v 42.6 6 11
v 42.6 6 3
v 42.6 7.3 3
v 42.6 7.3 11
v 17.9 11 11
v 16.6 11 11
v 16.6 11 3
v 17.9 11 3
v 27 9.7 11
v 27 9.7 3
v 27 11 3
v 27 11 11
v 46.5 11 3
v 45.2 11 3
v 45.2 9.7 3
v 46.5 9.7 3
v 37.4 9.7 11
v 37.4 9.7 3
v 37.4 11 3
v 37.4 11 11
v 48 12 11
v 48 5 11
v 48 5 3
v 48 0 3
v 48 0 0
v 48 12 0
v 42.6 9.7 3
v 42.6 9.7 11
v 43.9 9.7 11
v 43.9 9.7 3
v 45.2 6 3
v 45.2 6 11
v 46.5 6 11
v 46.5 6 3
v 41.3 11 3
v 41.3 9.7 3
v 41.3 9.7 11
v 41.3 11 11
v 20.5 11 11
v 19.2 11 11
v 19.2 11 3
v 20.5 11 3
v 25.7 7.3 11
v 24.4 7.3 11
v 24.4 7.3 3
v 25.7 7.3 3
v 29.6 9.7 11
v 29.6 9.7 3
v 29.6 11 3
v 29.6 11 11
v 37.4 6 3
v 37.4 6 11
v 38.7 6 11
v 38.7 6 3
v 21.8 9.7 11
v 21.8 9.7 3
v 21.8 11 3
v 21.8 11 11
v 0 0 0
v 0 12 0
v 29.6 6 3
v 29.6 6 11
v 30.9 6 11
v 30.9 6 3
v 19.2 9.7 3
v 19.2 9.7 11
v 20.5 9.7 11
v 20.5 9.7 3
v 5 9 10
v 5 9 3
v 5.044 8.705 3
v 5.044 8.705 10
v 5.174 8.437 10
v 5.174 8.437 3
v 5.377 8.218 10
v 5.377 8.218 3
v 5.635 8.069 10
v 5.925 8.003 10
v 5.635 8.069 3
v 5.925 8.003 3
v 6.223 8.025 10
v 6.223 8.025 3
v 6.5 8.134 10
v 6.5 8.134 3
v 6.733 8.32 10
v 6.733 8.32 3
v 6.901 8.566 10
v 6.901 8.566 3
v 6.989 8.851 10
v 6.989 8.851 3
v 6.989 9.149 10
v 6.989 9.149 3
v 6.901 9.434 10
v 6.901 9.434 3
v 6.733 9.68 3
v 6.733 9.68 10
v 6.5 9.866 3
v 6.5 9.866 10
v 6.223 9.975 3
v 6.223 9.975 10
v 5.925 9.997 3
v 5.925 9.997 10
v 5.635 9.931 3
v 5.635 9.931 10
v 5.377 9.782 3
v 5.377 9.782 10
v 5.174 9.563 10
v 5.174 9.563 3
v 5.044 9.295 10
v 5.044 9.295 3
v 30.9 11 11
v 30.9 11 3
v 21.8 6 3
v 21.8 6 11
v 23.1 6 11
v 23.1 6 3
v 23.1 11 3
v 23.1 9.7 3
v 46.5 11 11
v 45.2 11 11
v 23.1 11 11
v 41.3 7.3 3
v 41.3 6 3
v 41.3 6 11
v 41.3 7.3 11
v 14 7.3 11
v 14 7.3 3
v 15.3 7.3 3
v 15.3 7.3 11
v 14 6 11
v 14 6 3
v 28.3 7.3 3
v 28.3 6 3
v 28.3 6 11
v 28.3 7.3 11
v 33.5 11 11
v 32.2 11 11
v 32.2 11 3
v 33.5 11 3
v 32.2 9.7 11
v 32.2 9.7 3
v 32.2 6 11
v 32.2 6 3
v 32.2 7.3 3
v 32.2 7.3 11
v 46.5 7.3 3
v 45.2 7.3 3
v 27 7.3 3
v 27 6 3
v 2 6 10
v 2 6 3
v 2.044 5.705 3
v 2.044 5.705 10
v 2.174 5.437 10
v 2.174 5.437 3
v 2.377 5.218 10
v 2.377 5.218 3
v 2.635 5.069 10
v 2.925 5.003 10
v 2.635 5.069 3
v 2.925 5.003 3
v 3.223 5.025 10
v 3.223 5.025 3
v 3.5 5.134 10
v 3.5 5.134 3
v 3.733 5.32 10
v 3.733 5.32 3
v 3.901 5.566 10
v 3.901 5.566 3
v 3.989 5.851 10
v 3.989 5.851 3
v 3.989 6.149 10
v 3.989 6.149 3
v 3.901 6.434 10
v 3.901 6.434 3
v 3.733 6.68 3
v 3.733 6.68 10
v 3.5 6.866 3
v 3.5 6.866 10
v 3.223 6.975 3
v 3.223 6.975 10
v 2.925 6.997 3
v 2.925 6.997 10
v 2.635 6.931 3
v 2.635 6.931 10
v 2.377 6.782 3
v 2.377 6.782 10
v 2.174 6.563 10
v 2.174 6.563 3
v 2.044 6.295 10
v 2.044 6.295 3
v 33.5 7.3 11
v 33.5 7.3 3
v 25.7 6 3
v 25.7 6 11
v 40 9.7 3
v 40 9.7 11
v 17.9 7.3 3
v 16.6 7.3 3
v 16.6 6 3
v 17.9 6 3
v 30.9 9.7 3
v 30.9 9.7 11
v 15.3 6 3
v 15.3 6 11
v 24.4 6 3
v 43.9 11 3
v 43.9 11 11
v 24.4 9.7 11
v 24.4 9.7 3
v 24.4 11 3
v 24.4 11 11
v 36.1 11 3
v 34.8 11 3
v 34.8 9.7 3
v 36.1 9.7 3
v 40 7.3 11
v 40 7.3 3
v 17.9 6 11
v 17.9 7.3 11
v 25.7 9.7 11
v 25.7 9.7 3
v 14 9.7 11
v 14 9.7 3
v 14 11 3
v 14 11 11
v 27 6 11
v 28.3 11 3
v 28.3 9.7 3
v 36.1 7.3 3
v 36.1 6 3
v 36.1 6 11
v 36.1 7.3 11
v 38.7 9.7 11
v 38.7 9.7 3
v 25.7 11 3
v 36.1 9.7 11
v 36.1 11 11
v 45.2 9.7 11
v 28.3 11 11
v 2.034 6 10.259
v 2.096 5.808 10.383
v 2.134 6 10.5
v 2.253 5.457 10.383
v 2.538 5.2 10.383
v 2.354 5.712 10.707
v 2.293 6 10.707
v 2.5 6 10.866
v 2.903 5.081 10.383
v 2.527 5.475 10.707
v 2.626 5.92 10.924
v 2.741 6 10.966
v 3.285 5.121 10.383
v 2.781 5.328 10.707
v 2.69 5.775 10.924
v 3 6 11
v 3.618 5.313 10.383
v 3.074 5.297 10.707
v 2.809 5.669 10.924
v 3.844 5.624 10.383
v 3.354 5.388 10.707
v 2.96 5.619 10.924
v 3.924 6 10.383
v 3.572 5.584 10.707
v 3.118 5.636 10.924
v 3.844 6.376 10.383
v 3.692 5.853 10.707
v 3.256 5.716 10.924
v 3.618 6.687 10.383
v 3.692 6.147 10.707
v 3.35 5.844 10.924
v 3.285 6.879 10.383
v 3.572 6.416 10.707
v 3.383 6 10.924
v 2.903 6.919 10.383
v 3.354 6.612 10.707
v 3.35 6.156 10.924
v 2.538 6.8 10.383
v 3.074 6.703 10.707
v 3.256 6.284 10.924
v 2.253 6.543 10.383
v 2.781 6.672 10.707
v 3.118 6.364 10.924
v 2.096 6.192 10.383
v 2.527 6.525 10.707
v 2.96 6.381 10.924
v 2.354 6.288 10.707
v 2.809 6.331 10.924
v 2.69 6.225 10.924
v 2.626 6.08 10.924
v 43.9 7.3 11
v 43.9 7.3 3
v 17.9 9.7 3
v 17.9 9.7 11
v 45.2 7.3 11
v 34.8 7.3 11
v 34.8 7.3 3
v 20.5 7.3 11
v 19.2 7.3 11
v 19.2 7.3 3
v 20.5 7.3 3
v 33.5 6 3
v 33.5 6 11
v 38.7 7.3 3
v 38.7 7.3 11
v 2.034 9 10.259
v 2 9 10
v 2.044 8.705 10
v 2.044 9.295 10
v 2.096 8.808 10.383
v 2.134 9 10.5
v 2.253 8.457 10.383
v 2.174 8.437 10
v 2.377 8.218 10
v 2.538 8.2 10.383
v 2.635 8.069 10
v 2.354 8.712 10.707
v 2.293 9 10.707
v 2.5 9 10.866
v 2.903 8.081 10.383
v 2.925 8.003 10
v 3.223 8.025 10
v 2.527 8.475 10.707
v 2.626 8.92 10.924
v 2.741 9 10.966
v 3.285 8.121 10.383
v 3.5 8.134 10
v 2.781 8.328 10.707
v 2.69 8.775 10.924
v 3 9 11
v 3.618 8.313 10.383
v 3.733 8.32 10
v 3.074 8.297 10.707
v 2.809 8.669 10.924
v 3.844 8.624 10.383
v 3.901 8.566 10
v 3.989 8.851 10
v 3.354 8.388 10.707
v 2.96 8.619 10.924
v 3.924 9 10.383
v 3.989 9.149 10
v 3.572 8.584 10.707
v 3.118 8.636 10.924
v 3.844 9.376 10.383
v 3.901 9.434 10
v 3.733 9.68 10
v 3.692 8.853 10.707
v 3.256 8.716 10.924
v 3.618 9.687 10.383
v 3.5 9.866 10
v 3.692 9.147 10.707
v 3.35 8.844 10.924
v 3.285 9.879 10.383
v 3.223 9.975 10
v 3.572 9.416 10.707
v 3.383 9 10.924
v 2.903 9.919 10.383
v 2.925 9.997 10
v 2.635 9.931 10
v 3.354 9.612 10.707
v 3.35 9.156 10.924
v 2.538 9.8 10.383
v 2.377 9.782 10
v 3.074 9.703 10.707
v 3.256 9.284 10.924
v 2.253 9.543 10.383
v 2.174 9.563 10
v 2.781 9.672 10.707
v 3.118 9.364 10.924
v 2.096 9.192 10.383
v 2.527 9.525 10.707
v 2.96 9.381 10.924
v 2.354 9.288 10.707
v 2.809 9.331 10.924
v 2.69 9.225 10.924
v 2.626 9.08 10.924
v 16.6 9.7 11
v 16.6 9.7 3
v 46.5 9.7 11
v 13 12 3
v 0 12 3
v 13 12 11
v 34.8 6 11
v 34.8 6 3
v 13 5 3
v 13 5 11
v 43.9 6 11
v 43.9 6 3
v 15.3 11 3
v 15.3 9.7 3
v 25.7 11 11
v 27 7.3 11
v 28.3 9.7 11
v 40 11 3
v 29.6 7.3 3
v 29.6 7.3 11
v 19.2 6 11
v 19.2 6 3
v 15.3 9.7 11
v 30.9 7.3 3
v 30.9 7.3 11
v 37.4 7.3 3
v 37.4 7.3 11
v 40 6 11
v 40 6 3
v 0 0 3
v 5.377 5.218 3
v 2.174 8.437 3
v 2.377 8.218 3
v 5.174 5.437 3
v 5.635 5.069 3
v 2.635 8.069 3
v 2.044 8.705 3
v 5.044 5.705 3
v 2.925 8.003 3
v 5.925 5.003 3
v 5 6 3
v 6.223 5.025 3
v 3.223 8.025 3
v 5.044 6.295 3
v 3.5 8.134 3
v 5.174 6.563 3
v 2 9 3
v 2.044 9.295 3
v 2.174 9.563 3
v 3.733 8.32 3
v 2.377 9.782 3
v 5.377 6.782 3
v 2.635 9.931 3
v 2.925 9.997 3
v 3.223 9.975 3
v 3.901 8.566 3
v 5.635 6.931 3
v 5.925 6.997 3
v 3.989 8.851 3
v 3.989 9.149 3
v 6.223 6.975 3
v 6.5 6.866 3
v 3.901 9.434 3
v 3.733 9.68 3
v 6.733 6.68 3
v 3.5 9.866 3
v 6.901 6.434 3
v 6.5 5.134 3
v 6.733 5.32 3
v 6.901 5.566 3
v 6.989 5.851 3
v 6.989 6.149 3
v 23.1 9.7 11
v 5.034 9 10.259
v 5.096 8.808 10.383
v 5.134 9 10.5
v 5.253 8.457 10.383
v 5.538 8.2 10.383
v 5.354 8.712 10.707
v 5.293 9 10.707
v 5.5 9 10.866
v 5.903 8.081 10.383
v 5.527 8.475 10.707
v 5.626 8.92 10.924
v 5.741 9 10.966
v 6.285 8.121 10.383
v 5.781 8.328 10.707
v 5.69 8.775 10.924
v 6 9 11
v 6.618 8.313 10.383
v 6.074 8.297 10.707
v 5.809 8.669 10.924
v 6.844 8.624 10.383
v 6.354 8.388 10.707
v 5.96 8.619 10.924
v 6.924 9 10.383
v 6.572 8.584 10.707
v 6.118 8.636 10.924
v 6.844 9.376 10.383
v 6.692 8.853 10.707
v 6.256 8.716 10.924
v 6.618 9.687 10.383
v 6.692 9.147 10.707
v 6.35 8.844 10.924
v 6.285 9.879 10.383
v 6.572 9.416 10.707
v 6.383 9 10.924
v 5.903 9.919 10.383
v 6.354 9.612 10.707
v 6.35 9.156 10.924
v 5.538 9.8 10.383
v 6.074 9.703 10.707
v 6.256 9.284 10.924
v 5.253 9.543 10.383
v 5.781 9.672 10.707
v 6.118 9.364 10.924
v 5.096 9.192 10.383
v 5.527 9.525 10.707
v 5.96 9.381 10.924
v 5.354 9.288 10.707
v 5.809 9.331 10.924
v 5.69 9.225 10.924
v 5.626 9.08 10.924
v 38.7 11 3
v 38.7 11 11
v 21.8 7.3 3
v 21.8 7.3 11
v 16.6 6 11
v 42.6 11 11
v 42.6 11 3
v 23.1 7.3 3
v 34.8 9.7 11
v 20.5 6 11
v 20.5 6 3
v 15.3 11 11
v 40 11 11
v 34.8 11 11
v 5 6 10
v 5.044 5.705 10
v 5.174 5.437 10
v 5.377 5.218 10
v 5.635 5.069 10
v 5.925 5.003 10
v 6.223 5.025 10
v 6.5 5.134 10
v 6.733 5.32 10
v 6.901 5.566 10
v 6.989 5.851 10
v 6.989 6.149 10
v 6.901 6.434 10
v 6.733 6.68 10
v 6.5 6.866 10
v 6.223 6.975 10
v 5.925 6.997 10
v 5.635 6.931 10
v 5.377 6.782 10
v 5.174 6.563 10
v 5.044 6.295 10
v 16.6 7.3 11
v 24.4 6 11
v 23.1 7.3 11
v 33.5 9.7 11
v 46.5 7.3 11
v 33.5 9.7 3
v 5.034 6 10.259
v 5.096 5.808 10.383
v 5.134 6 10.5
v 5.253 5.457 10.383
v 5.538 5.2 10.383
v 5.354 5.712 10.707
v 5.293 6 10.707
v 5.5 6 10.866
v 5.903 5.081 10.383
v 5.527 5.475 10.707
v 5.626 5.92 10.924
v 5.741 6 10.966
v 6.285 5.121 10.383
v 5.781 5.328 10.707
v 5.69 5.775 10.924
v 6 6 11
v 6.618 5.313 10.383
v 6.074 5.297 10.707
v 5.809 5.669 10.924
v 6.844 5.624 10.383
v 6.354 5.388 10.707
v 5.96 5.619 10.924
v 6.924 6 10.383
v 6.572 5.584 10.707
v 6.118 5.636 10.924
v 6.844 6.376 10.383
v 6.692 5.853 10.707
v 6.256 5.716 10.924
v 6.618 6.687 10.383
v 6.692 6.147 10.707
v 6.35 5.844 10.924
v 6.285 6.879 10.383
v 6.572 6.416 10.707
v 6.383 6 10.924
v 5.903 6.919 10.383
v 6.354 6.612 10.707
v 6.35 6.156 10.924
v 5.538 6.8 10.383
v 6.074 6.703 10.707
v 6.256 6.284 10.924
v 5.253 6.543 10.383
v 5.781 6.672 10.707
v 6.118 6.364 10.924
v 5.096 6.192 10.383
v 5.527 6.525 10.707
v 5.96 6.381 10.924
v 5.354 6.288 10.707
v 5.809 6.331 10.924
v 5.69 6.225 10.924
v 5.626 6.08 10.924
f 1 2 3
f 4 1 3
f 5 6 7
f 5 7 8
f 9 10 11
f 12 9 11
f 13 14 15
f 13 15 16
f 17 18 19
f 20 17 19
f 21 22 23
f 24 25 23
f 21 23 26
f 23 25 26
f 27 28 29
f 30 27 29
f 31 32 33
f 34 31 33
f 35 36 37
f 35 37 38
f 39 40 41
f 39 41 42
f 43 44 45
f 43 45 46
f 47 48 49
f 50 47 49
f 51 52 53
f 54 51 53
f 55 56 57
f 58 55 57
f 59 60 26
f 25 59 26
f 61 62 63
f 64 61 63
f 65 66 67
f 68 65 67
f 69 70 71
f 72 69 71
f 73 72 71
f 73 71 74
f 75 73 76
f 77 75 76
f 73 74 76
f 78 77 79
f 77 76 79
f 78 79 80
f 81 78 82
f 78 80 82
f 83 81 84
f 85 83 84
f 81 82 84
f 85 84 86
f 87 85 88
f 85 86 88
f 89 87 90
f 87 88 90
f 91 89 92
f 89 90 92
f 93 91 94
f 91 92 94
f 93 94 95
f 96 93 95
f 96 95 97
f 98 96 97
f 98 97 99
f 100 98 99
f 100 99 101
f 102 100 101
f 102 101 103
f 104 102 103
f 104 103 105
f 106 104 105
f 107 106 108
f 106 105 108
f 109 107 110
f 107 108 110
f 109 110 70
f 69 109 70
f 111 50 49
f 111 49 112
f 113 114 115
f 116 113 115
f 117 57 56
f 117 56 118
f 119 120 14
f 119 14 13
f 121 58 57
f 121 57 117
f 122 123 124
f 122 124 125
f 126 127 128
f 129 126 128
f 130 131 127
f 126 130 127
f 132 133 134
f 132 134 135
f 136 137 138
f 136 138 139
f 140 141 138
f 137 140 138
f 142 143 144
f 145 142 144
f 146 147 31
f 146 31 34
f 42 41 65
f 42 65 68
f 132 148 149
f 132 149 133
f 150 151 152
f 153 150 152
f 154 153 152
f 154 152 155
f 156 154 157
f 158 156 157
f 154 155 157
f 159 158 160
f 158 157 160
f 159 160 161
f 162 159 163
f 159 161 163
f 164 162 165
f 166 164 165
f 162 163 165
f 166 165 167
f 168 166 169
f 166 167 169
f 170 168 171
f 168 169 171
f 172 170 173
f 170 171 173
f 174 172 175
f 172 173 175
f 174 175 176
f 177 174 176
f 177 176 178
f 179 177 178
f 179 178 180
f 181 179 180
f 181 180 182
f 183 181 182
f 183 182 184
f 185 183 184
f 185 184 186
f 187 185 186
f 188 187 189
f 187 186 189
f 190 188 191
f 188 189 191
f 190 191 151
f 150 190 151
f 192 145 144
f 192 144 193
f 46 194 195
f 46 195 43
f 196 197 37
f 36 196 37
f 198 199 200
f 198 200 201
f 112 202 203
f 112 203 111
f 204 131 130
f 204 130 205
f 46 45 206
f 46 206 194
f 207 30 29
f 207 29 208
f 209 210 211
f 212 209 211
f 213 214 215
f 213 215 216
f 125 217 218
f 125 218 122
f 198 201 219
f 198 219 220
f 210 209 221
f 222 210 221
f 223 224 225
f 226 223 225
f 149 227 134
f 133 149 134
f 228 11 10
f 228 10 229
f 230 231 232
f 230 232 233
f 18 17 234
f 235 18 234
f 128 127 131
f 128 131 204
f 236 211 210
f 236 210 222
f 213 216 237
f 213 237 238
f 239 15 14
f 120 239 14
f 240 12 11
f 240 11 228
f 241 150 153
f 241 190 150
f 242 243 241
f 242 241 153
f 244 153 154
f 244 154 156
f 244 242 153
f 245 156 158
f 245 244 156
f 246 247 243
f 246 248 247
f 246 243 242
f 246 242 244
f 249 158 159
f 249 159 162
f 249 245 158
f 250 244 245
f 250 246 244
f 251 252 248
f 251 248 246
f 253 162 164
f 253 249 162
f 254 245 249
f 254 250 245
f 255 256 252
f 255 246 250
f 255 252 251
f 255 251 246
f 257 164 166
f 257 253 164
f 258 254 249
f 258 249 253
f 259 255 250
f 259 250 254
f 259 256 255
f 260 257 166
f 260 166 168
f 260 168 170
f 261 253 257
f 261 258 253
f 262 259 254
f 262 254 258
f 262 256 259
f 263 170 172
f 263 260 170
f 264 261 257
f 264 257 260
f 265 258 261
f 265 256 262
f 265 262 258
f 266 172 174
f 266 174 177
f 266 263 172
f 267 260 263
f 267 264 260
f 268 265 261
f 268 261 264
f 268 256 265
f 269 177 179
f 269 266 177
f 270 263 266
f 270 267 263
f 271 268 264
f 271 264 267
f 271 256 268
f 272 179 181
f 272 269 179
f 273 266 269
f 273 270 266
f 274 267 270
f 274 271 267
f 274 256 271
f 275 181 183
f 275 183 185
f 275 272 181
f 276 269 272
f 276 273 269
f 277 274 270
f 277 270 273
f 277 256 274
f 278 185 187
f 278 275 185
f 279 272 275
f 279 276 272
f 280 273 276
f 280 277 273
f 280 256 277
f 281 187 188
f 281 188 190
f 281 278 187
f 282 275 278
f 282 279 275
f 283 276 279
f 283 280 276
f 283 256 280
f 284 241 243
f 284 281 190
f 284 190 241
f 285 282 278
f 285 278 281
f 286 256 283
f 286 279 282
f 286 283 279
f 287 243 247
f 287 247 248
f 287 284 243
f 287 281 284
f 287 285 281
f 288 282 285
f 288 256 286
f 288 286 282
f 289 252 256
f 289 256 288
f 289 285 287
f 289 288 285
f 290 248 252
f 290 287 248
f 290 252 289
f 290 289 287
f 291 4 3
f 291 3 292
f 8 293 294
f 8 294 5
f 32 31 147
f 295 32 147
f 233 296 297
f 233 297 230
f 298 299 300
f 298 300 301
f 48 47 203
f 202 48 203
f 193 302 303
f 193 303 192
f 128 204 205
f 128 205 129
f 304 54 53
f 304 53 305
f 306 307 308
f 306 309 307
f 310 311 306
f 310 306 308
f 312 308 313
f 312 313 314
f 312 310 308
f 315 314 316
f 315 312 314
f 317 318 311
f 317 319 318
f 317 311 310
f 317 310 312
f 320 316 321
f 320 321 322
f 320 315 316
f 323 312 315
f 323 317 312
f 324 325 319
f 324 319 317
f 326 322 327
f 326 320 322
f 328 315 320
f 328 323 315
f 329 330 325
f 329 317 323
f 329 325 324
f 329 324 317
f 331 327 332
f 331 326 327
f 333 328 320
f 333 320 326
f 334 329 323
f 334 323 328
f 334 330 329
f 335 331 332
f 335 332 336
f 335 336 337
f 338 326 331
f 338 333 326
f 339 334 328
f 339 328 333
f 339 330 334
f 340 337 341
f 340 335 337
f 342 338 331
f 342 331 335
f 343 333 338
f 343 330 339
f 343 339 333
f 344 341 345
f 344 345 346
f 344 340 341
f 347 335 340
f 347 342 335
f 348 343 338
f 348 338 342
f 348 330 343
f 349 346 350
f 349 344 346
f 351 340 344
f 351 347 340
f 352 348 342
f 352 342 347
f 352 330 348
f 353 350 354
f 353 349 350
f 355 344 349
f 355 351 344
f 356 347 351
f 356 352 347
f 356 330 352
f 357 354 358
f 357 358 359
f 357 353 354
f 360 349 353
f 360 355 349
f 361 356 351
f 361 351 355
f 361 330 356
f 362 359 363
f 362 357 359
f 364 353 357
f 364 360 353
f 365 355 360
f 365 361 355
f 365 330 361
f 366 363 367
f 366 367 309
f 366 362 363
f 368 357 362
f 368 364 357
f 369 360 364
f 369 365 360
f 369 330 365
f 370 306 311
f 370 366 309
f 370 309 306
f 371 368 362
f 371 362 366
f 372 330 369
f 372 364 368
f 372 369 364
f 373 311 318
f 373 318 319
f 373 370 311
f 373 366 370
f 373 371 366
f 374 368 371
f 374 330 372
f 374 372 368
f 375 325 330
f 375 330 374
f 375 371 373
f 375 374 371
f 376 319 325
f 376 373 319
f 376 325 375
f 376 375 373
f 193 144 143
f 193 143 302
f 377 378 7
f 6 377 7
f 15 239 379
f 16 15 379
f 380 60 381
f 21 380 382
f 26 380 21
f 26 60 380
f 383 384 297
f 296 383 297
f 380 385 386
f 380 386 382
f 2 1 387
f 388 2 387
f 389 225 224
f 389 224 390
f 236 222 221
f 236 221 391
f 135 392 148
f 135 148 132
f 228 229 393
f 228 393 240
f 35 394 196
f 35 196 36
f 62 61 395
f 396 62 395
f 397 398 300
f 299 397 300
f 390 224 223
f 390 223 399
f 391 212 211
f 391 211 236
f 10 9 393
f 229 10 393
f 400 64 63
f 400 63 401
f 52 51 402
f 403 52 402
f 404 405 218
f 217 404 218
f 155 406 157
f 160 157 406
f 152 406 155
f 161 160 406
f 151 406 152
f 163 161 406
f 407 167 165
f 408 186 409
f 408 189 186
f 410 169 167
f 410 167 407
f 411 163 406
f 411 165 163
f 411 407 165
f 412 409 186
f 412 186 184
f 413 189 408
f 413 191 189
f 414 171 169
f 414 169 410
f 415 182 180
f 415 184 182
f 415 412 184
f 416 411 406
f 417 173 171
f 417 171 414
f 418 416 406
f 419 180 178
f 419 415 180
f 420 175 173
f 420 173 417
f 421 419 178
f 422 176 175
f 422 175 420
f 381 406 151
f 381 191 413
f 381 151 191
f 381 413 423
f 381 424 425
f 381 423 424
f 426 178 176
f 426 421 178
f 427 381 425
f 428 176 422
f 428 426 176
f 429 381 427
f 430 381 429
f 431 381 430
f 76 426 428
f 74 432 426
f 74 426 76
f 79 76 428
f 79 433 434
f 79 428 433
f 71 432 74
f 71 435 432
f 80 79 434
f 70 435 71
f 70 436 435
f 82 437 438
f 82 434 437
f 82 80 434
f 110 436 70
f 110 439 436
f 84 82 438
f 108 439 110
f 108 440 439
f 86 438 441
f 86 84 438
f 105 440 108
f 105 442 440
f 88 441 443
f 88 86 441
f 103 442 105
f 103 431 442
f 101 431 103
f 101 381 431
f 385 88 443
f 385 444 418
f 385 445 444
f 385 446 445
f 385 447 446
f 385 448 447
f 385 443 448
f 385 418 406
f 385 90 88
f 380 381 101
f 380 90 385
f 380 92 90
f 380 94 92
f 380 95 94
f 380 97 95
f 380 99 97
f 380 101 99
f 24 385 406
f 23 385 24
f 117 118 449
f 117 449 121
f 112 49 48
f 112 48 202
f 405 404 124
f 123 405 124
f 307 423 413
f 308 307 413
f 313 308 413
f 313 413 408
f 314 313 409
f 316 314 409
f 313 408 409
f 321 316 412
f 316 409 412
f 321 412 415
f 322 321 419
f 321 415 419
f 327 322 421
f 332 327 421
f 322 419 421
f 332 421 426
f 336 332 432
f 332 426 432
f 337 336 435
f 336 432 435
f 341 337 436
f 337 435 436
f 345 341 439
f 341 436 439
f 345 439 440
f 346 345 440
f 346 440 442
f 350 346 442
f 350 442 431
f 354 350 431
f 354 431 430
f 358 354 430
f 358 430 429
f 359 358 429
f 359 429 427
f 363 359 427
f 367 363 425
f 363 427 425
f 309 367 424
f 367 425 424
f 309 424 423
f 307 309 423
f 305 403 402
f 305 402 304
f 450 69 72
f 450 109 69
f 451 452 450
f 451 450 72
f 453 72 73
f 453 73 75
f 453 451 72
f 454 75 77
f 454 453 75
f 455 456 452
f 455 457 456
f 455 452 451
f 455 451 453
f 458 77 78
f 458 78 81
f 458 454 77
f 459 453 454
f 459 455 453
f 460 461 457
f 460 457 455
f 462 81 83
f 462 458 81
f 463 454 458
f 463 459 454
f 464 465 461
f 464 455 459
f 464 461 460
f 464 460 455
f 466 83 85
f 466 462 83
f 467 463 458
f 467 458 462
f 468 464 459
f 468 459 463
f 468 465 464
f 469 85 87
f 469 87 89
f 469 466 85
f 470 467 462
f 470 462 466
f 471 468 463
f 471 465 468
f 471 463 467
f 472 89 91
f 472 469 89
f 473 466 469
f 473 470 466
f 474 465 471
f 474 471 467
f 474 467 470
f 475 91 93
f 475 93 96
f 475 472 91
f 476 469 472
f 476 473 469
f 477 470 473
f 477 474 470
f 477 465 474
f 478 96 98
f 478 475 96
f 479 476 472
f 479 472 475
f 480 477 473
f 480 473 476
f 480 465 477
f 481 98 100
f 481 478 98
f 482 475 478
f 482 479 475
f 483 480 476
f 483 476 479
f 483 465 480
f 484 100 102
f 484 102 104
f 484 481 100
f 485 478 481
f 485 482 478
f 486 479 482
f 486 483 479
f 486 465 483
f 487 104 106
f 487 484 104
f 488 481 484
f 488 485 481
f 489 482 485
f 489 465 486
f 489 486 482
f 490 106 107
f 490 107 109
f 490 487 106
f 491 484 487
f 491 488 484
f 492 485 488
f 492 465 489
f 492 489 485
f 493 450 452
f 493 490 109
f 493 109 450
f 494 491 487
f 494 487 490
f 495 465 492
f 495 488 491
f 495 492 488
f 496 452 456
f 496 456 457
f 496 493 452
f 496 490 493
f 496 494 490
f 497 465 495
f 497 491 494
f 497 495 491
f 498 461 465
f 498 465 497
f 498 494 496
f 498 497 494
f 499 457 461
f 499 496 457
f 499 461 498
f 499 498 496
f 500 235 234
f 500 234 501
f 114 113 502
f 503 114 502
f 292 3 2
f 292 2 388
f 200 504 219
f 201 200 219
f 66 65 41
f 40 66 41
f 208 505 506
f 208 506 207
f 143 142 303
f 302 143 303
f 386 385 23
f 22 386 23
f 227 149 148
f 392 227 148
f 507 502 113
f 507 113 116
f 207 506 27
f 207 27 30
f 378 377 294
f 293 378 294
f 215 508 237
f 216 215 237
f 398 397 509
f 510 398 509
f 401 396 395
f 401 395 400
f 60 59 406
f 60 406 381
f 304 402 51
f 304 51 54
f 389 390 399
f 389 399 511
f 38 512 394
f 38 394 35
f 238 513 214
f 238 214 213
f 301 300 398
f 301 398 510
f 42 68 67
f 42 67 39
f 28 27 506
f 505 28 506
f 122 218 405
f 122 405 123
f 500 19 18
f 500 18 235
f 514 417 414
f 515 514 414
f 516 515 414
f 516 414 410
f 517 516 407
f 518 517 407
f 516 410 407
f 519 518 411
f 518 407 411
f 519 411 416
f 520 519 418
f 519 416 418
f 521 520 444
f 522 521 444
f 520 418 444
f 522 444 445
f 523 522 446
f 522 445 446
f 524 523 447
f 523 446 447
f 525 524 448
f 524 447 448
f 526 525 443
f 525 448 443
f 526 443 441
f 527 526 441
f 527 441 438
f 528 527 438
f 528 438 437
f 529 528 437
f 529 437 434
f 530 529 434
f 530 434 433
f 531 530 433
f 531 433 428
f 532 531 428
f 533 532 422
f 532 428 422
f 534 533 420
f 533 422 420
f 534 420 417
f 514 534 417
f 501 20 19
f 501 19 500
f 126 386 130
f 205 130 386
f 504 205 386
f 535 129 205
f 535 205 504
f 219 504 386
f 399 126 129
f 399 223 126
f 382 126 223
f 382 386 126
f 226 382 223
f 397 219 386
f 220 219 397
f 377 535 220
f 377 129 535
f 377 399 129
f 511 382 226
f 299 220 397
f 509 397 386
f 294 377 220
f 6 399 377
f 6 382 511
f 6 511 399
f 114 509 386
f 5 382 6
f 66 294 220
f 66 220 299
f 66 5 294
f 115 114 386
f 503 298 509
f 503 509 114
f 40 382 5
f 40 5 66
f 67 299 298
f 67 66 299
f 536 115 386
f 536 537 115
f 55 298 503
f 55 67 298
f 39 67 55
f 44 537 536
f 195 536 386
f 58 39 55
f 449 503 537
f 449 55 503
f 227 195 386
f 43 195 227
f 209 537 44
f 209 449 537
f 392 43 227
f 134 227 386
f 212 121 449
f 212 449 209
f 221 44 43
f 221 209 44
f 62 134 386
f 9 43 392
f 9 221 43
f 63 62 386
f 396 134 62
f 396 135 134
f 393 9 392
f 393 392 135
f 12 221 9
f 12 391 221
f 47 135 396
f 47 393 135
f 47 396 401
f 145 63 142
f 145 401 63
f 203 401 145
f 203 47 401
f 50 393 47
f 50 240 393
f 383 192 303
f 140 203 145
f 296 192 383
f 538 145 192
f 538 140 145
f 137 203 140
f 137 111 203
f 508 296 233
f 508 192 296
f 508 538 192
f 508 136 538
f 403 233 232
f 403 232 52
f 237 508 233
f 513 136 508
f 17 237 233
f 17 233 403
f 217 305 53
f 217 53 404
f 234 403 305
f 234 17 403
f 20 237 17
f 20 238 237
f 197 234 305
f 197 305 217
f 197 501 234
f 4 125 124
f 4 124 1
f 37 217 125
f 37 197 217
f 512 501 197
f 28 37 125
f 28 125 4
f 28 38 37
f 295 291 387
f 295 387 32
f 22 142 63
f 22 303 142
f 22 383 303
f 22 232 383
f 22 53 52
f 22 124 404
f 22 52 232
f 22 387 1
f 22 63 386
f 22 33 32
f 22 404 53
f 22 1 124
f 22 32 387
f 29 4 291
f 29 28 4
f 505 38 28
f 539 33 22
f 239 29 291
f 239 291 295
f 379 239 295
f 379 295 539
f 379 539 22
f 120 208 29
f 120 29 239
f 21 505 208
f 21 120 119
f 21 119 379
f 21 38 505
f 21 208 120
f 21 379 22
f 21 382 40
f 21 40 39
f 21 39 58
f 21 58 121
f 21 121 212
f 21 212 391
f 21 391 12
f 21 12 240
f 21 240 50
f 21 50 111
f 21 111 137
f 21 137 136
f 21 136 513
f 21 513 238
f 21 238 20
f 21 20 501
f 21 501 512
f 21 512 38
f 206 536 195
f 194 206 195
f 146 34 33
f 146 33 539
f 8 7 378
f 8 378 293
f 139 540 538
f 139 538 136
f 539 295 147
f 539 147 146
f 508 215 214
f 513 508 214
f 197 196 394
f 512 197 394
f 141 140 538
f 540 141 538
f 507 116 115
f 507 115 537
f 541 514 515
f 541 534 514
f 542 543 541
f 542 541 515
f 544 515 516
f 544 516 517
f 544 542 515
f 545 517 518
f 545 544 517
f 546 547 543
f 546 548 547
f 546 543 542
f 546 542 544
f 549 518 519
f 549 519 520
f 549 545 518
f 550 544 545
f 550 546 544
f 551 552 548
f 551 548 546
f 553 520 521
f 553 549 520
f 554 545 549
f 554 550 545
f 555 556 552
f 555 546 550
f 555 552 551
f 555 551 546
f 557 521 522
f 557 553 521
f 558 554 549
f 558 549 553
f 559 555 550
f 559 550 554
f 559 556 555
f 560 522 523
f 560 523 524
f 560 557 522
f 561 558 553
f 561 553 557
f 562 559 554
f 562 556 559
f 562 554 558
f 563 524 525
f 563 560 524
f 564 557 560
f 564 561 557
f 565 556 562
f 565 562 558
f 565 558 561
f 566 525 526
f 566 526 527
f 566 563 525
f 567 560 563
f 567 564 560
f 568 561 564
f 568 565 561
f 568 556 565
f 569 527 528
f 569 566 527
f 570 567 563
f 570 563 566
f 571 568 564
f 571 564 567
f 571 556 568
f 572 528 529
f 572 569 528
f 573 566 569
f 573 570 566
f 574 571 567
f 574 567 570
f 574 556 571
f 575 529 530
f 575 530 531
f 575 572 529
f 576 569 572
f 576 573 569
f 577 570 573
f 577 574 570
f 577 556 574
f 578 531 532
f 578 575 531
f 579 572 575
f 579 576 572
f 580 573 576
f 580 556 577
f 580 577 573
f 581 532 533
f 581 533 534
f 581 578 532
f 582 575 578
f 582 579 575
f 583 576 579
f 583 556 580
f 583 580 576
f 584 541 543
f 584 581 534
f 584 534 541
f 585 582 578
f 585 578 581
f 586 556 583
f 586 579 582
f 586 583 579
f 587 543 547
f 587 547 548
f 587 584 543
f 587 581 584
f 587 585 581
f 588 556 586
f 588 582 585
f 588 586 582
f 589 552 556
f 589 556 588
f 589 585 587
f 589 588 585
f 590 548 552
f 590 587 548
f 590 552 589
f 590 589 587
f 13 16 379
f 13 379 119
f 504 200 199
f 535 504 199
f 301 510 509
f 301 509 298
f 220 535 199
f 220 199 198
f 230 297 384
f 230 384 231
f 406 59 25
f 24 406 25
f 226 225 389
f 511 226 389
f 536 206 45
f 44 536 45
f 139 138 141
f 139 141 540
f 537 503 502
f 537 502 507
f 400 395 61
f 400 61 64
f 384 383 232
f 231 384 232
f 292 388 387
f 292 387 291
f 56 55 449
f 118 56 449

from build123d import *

# Parameters (mm, degrees)
SKETCH1_W           = 48
SKETCH1_H           = 12
BOSS_EXTRUDE1_DEPTH = 3
SKETCH2_W           = 35
SKETCH2_H           = 7
SKETCH2_W_2         = 1.3
SKETCH2_H_2         = 1.3
BOSS_EXTRUDE2_DEPTH = 8
SKETCH3_R           = 1
BOSS_EXTRUDE3_DEPTH = 8
FILLET1_R           = 1


with BuildPart() as part:
    # Sketch1 → Boss-Extrude1 (new body)
    with BuildSketch(Plane.XY):
        with Locations((24, 6)):
            Rectangle(SKETCH1_W, SKETCH1_H)
    extrude(amount=BOSS_EXTRUDE1_DEPTH)

    # Sketch2 → Boss-Extrude2 (add)
    with BuildSketch(Plane.XY.offset(3)):
        with Locations((30.5, 8.5)):
            Rectangle(SKETCH2_W, SKETCH2_H)
        with Locations((17.25, 10.35)):
            Rectangle(SKETCH2_W_2, SKETCH2_H_2, mode=Mode.SUBTRACT)
        with Locations((14.65, 10.35)):
            Rectangle(SKETCH2_W_2, SKETCH2_H_2, mode=Mode.SUBTRACT)
        with Locations((14.65, 6.65)):
            Rectangle(SKETCH2_W_2, SKETCH2_H_2, mode=Mode.SUBTRACT)
        with Locations((17.25, 6.65)):
            Rectangle(SKETCH2_W_2, SKETCH2_H_2, mode=Mode.SUBTRACT)
        with Locations((19.85, 10.35)):
            Rectangle(SKETCH2_W_2, SKETCH2_H_2, mode=Mode.SUBTRACT)
        with Locations((19.85, 6.65)):
            Rectangle(SKETCH2_W_2, SKETCH2_H_2, mode=Mode.SUBTRACT)
        with Locations((22.45, 10.35)):
            Rectangle(SKETCH2_W_2, SKETCH2_H_2, mode=Mode.SUBTRACT)
        with Locations((22.45, 6.65)):
            Rectangle(SKETCH2_W_2, SKETCH2_H_2, mode=Mode.SUBTRACT)
        with Locations((25.05, 10.35)):
            Rectangle(SKETCH2_W_2, SKETCH2_H_2, mode=Mode.SUBTRACT)
        with Locations((25.05, 6.65)):
            Rectangle(SKETCH2_W_2, SKETCH2_H_2, mode=Mode.SUBTRACT)
        with Locations((27.65, 10.35)):
            Rectangle(SKETCH2_W_2, SKETCH2_H_2, mode=Mode.SUBTRACT)
        with Locations((27.65, 6.65)):
            Rectangle(SKETCH2_W_2, SKETCH2_H_2, mode=Mode.SUBTRACT)
        with Locations((30.25, 10.35)):
            Rectangle(SKETCH2_W_2, SKETCH2_H_2, mode=Mode.SUBTRACT)
        with Locations((30.25, 6.65)):
            Rectangle(SKETCH2_W_2, SKETCH2_H_2, mode=Mode.SUBTRACT)
        with Locations((32.85, 10.35)):
            Rectangle(SKETCH2_W_2, SKETCH2_H_2, mode=Mode.SUBTRACT)
        with Locations((32.85, 6.65)):
            Rectangle(SKETCH2_W_2, SKETCH2_H_2, mode=Mode.SUBTRACT)
        with Locations((35.45, 10.35)):
            Rectangle(SKETCH2_W_2, SKETCH2_H_2, mode=Mode.SUBTRACT)
        with Locations((35.45, 6.65)):
            Rectangle(SKETCH2_W_2, SKETCH2_H_2, mode=Mode.SUBTRACT)
        with Locations((38.05, 10.35)):
            Rectangle(SKETCH2_W_2, SKETCH2_H_2, mode=Mode.SUBTRACT)
        with Locations((38.05, 6.65)):
            Rectangle(SKETCH2_W_2, SKETCH2_H_2, mode=Mode.SUBTRACT)
        with Locations((40.65, 10.35)):
            Rectangle(SKETCH2_W_2, SKETCH2_H_2, mode=Mode.SUBTRACT)
        with Locations((40.65, 6.65)):
            Rectangle(SKETCH2_W_2, SKETCH2_H_2, mode=Mode.SUBTRACT)
        with Locations((43.25, 10.35)):
            Rectangle(SKETCH2_W_2, SKETCH2_H_2, mode=Mode.SUBTRACT)
        with Locations((43.25, 6.65)):
            Rectangle(SKETCH2_W_2, SKETCH2_H_2, mode=Mode.SUBTRACT)
        with Locations((45.85, 10.35)):
            Rectangle(SKETCH2_W_2, SKETCH2_H_2, mode=Mode.SUBTRACT)
        with Locations((45.85, 6.65)):
            Rectangle(SKETCH2_W_2, SKETCH2_H_2, mode=Mode.SUBTRACT)
    extrude(amount=BOSS_EXTRUDE2_DEPTH)

    # Sketch3 → Boss-Extrude3 (add)
    with BuildSketch(Plane.XY.offset(3)):
        with Locations(Location((3, 9, 0), (0, 0, 180))):
            Circle(SKETCH3_R)
        with Locations(Location((3, 6, 0), (0, 0, 180))):
            Circle(SKETCH3_R)
        with Locations(Location((6, 9, 0), (0, 0, 180))):
            Circle(SKETCH3_R)
        with Locations(Location((6, 6, 0), (0, 0, 180))):
            Circle(SKETCH3_R)
    extrude(amount=BOSS_EXTRUDE3_DEPTH)

    # Fillet1
    fillet1_edges = [part.edges().sort_by_distance(p)[0] for p in [
        (4, 9, 11),
        (4, 6, 11),
        (7, 9, 11),
        (7, 6, 11),
    ]]
    fillet(fillet1_edges, radius=FILLET1_R)


solid = part.part
